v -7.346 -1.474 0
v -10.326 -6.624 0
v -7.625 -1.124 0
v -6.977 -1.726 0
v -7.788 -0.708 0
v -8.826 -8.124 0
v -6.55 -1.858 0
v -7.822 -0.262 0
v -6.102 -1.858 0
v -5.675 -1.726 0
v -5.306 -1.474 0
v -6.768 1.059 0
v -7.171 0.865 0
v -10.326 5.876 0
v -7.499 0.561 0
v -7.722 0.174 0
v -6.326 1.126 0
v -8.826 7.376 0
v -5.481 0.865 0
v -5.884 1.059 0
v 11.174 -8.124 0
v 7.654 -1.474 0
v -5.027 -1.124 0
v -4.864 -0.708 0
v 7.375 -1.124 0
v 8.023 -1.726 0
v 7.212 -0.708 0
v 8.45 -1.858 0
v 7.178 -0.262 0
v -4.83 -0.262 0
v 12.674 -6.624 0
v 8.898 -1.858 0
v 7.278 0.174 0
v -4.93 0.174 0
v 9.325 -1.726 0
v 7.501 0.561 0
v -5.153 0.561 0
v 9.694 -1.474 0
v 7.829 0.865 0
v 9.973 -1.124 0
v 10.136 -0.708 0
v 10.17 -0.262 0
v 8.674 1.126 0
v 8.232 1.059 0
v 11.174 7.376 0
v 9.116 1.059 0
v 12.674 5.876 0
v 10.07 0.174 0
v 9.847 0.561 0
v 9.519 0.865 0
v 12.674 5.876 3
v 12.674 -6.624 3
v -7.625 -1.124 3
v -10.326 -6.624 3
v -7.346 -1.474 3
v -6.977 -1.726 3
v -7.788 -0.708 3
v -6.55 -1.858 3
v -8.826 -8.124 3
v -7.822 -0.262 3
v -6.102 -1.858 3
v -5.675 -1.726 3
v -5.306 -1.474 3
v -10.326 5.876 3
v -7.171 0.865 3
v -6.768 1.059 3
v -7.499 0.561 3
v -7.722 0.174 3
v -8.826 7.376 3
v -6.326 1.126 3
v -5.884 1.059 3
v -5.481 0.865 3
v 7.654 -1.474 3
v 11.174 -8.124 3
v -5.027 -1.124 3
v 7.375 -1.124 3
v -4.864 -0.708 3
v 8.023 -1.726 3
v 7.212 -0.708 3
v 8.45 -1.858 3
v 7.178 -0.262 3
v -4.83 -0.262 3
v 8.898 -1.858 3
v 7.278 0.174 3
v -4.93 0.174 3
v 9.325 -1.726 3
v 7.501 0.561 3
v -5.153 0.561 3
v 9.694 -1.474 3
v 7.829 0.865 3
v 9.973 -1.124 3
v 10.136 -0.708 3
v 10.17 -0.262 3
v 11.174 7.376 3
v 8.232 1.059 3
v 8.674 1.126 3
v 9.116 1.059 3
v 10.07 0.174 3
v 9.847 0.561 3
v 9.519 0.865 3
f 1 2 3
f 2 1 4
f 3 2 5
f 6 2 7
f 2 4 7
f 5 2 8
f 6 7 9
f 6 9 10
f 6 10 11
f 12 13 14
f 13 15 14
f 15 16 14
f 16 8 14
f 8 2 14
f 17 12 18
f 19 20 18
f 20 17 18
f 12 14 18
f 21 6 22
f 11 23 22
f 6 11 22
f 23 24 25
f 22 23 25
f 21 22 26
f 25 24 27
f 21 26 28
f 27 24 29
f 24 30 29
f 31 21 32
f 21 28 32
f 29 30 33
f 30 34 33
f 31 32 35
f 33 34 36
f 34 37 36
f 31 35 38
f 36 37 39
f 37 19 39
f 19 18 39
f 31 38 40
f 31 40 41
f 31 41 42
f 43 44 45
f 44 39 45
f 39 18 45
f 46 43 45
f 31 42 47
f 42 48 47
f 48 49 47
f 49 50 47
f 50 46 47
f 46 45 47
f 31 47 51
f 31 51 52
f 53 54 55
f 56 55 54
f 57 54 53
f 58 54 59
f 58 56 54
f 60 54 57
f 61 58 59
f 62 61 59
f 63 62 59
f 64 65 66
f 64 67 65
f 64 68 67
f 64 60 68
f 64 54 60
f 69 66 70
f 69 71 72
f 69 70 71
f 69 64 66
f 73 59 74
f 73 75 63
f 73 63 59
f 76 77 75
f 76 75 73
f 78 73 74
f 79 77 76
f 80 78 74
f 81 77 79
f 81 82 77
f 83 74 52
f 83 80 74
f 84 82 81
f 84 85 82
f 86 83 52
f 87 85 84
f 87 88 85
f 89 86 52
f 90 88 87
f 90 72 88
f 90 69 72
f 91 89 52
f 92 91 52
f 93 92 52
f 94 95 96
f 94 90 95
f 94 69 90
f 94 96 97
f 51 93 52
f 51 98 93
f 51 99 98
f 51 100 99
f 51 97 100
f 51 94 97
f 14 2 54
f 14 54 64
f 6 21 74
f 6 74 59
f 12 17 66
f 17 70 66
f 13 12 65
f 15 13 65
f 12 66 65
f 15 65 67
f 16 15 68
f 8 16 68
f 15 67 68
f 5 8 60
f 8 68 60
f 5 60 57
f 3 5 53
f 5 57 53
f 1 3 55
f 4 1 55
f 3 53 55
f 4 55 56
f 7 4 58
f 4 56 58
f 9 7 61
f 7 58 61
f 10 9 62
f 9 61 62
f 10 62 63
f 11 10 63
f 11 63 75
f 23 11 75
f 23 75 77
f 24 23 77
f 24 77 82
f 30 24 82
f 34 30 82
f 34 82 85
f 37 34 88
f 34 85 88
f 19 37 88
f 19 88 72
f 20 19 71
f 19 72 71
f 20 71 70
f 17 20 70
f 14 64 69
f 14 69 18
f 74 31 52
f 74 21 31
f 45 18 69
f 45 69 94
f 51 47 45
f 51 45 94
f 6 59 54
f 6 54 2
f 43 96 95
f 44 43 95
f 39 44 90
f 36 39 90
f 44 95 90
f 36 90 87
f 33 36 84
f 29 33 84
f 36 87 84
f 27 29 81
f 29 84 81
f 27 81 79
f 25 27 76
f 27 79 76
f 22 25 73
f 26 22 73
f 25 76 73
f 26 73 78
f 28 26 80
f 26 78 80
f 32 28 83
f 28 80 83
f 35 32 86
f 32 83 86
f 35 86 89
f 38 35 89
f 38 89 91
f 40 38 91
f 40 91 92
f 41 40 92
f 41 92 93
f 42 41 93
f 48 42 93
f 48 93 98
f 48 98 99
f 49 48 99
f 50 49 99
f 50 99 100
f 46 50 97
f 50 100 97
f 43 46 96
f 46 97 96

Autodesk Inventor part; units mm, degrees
ref_plane "YZ Plane" through (0, 0, 0) normal (1, 0, 0) x (0, 1, 0)
ref_plane "XZ Plane" through (0, 0, 0) normal (0, 1, 0) x (-1, 0, 0)
ref_plane "XY Plane" through (0, 0, 0) normal (0, 0, 1) x (1, 0, 0)
sketch "Szkic1" plane through (0, 0, 0) normal (0, 0, 1) x (1, 0, 0)
  line L0 (-10.326, 7.3757) -> (12.674, 7.3757)
  line L1 (12.674, 7.3757) -> (12.674, -8.1243)
  line L2 (12.674, -8.1243) -> (-10.326, -8.1243)
  line L3 (-10.326, -8.1243) -> (-10.326, 7.3757)
  point P0 (0, 0)
  point P1 (-6.326, -0.3743)
  point P2 (8.674, -0.3743)
  dimension "d0" = 23
  dimension "d1" = 15.5
  dimension "d4" = 7.75
  dimension "d5" = 7.75
  dimension "d6" = 4
  dimension "d7" = 4
extrude "Wyciągnięcie proste1" add sketch "Szkic1" along normal blind 3
hole "Otwór1" at (-6.326, -0.3743, 0) at (8.674, -0.3743, 0) direction (0, 0, 1) diameter 3 end through all
chamfer "Faza1" distance 1.5 angle 45 4 edges at (12.674, -8.1243, 1.5) (-10.326, -8.1243, 1.5) (-10.326, 7.3757, 1.5) (12.674, 7.3757, 1.5)
equation "\"d4\" = 0.5 * d1"
equation "\"d5\" = d4"
equation "\"d7\" = d6"
properties part number "LC_ALU_3mm_Timing_Belt_Clamp_Y_Axis"
